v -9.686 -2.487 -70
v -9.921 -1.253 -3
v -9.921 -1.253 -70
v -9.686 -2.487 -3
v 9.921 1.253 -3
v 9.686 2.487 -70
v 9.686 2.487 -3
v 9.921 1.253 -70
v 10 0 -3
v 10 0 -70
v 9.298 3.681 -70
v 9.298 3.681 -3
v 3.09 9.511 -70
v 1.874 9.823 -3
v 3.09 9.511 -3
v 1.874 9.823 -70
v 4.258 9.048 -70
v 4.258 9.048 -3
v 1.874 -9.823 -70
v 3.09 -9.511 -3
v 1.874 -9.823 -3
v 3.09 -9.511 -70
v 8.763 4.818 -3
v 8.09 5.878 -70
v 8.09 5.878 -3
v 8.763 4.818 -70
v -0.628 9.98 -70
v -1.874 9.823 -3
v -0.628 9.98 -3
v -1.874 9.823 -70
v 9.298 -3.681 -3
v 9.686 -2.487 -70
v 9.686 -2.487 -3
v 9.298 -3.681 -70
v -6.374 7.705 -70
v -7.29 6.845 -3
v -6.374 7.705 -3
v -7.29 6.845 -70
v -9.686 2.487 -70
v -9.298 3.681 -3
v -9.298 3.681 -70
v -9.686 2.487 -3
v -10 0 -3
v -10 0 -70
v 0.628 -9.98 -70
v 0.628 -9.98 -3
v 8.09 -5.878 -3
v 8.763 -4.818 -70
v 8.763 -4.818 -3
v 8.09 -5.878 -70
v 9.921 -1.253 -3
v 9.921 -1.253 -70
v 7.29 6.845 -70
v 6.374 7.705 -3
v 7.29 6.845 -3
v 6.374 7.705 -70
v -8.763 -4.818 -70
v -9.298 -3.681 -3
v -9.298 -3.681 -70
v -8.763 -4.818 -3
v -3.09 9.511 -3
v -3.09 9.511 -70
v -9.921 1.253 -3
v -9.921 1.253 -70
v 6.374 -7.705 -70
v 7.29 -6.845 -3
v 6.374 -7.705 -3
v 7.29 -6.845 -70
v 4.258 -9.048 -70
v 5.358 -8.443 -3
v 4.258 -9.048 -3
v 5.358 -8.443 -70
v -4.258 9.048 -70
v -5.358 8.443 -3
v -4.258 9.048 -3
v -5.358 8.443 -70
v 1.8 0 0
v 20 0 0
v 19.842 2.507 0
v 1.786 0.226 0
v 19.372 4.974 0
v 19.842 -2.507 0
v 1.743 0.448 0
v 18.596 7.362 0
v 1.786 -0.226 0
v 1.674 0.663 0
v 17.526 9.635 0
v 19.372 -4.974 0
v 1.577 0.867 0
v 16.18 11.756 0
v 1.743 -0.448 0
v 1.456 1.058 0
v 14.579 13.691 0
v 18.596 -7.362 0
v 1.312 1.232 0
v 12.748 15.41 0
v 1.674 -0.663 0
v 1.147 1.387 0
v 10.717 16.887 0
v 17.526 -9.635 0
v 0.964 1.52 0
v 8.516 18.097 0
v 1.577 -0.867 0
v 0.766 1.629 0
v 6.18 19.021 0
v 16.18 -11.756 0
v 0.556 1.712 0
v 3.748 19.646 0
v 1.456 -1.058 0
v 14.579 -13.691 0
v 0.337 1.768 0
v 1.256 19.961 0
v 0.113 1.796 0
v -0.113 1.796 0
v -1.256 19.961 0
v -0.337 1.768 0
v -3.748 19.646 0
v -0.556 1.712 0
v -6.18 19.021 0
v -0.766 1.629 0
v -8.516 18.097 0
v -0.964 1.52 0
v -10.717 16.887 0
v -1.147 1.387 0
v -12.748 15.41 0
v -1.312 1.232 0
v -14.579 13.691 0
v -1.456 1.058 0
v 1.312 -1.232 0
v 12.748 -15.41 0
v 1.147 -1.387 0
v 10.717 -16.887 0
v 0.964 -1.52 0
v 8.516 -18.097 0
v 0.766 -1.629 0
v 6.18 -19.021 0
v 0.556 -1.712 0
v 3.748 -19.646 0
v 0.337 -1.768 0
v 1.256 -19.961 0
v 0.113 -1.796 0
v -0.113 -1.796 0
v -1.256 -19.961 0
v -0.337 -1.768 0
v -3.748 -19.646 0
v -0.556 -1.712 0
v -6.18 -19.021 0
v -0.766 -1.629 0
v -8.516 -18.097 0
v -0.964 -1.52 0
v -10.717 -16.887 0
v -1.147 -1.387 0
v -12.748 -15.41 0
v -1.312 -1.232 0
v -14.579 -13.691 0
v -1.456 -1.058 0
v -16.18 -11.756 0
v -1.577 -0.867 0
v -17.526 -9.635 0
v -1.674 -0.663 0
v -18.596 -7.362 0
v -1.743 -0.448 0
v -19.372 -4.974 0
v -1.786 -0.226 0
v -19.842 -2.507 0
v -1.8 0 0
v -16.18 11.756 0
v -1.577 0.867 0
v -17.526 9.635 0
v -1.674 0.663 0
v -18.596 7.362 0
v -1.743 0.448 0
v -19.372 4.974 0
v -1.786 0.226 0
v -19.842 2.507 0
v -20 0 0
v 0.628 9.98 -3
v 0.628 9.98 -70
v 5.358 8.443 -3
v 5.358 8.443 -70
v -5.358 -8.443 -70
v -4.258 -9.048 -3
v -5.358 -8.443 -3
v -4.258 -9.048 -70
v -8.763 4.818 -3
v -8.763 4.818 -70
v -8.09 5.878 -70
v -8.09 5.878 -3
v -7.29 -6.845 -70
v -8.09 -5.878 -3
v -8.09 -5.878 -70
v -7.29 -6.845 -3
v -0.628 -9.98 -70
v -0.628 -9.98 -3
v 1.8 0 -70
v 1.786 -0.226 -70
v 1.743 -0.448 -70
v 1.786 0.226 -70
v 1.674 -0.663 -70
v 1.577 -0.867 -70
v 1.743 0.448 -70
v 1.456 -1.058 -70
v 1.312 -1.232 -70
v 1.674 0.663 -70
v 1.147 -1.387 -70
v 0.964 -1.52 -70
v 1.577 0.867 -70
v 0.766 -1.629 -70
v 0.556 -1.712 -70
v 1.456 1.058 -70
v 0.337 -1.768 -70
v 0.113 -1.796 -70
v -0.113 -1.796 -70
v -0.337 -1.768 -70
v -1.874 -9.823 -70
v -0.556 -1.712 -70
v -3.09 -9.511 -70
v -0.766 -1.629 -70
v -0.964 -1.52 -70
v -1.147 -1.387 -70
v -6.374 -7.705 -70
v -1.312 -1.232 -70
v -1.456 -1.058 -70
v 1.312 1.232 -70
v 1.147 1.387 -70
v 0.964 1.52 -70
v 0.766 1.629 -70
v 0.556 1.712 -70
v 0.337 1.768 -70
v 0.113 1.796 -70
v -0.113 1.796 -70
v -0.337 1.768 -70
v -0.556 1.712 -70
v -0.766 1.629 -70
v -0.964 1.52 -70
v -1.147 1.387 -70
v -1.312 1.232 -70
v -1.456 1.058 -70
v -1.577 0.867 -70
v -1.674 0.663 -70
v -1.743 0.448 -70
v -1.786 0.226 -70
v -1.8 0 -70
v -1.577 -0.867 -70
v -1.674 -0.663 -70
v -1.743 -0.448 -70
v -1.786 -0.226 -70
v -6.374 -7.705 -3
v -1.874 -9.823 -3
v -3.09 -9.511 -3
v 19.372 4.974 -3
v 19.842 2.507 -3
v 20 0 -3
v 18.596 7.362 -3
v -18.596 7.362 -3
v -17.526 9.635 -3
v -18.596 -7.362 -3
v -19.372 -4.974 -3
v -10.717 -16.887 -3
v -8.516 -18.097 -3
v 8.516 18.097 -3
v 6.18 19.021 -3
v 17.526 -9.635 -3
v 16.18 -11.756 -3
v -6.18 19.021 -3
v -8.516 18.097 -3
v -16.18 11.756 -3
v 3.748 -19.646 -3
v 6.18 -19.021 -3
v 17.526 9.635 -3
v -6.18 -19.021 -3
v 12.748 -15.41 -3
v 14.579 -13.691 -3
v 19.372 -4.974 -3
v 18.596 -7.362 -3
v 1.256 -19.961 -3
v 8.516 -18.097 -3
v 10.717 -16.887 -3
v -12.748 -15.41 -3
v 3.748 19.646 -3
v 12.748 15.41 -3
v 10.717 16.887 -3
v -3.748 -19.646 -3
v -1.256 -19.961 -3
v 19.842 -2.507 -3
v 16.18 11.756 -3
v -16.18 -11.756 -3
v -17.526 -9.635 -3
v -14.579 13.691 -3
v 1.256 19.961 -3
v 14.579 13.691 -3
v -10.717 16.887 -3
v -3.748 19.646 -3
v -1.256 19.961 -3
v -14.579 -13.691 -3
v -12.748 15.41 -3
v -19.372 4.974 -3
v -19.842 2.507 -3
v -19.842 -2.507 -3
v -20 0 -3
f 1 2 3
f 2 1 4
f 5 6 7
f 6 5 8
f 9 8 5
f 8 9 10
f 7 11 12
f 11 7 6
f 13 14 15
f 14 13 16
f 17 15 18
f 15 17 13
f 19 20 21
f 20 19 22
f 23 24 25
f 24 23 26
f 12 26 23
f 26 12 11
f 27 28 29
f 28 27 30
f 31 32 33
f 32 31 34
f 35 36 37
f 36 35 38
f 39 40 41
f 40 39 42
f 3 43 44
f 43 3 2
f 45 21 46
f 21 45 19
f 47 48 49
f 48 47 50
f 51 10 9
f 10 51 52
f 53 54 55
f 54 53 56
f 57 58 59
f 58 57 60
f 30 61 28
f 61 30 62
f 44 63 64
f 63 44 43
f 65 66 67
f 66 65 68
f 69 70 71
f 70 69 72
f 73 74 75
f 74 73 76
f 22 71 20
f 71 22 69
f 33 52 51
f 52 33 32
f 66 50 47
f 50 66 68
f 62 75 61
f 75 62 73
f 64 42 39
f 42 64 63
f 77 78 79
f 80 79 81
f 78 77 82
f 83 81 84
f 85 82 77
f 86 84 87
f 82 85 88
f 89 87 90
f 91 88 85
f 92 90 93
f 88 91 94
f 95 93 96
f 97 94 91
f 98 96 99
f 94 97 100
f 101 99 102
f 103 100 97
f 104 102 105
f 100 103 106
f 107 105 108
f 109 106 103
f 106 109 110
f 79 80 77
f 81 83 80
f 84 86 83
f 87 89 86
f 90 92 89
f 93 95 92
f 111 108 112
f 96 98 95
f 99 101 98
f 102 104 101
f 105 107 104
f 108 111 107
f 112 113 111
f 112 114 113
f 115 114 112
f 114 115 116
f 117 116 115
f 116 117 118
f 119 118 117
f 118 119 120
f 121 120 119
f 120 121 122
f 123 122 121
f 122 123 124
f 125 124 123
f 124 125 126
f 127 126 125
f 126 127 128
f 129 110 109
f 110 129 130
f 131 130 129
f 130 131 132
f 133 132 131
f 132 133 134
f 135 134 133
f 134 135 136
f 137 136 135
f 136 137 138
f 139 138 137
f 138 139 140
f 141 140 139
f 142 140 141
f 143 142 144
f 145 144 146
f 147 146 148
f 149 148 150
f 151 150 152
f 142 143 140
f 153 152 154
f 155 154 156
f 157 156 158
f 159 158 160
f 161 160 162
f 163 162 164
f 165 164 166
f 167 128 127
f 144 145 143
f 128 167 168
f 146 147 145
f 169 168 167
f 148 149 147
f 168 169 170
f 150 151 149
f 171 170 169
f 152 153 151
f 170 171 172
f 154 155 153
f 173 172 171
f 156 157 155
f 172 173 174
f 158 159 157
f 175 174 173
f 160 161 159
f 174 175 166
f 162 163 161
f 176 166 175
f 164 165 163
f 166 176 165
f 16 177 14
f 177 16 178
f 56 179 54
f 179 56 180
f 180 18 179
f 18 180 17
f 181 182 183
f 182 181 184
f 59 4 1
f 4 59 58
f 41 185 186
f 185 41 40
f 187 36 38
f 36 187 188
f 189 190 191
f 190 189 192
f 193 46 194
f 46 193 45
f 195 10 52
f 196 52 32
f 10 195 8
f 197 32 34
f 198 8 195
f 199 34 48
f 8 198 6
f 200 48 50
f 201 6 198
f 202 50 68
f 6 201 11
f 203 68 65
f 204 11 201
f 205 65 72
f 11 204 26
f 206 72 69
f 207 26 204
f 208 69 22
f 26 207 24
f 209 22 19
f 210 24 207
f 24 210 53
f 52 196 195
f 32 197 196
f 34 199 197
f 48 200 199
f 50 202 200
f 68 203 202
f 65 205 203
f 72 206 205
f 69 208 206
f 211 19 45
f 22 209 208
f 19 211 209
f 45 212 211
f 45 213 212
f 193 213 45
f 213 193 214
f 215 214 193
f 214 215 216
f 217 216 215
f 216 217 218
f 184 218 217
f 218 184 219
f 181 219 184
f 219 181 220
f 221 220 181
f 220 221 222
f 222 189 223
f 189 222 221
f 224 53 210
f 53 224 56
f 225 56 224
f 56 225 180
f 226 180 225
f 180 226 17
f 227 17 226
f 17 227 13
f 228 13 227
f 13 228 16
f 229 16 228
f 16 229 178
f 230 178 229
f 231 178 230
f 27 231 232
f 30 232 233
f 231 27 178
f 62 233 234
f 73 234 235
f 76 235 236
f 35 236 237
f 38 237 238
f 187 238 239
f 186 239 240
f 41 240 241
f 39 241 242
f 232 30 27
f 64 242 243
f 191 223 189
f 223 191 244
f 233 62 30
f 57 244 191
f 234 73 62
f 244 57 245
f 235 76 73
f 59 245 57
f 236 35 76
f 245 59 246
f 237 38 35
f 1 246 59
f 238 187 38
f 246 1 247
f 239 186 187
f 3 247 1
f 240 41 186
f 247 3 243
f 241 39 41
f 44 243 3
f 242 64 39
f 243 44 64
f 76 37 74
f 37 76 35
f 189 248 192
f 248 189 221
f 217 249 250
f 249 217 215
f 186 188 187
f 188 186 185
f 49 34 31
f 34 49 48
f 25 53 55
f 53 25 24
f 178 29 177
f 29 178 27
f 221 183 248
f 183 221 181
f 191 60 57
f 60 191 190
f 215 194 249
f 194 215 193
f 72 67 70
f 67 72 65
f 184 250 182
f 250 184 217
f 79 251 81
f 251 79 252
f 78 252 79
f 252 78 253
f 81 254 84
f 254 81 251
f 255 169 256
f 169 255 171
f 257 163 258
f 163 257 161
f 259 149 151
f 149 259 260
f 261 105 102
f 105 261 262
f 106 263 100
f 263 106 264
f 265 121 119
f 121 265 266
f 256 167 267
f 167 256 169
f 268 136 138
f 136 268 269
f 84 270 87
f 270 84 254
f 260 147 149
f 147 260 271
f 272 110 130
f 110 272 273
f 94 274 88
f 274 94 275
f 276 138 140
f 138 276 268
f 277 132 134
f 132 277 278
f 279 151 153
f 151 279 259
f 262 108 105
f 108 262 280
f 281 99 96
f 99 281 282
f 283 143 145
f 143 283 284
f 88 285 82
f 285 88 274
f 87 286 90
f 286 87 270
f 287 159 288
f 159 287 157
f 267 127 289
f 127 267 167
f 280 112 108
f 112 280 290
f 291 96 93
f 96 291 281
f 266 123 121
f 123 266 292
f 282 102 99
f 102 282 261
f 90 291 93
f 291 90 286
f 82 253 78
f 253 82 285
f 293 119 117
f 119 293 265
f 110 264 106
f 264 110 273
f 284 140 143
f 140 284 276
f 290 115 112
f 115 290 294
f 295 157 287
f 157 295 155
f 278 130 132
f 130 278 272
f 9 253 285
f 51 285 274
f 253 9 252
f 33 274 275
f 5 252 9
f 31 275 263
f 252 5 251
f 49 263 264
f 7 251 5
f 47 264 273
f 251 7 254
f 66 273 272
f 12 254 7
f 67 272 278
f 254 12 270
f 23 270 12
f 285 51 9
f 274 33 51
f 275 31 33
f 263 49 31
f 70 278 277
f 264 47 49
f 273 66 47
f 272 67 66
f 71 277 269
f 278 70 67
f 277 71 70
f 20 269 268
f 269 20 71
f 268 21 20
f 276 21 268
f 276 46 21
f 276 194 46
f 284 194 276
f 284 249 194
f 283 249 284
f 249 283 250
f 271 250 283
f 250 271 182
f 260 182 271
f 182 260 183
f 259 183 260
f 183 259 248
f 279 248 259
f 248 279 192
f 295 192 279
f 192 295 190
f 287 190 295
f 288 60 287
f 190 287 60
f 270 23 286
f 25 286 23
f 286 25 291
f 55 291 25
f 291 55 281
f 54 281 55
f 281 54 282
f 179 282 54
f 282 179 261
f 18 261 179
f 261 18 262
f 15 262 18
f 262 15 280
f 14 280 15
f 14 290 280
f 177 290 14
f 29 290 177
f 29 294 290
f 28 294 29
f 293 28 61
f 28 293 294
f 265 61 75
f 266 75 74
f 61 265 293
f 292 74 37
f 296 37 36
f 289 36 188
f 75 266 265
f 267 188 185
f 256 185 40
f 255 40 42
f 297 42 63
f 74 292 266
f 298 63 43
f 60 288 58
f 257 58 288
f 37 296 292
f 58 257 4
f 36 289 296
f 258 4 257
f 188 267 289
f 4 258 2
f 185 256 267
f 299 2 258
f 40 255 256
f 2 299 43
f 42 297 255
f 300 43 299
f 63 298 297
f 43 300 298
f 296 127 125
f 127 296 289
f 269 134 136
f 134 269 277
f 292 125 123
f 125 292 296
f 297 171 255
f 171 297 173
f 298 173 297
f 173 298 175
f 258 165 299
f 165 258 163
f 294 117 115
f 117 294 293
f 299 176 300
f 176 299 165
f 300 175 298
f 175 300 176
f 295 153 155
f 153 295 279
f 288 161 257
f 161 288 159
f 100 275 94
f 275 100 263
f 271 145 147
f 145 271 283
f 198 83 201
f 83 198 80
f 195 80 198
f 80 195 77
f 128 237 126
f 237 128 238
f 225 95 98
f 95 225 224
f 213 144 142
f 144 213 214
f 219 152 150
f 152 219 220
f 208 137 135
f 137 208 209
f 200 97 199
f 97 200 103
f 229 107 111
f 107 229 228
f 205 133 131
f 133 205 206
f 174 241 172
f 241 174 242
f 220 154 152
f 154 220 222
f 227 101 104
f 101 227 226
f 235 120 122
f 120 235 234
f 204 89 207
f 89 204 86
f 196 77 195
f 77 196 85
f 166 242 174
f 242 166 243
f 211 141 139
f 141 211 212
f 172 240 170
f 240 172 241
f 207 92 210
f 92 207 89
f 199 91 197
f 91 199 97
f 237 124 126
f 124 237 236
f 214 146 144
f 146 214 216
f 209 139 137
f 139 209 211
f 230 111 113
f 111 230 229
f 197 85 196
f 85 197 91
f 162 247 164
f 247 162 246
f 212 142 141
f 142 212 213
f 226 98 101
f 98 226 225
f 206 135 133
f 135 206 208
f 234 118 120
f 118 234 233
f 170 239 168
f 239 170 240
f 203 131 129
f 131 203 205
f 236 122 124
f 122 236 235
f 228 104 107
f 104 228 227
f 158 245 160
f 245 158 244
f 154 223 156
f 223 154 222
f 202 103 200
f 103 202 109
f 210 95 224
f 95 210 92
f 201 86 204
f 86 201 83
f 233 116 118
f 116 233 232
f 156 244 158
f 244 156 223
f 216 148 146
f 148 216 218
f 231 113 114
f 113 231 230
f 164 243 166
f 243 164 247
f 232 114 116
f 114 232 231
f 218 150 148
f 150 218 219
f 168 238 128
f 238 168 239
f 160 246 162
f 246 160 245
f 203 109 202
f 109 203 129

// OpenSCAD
$fn = 50;


difference() {
	union() {
		translate(v = [0, 0, -70.0000000000]) {
			cylinder(h = 70, r = 10.0000000000);
		}
		translate(v = [0, 0, -3.0000000000]) {
			cylinder(h = 3, r = 20.0000000000);
		}
	}
	union() {
		#translate(v = [0, 0, -70]) {
			cylinder(h = 70, r = 1.8000000000);
		}
	}
}
